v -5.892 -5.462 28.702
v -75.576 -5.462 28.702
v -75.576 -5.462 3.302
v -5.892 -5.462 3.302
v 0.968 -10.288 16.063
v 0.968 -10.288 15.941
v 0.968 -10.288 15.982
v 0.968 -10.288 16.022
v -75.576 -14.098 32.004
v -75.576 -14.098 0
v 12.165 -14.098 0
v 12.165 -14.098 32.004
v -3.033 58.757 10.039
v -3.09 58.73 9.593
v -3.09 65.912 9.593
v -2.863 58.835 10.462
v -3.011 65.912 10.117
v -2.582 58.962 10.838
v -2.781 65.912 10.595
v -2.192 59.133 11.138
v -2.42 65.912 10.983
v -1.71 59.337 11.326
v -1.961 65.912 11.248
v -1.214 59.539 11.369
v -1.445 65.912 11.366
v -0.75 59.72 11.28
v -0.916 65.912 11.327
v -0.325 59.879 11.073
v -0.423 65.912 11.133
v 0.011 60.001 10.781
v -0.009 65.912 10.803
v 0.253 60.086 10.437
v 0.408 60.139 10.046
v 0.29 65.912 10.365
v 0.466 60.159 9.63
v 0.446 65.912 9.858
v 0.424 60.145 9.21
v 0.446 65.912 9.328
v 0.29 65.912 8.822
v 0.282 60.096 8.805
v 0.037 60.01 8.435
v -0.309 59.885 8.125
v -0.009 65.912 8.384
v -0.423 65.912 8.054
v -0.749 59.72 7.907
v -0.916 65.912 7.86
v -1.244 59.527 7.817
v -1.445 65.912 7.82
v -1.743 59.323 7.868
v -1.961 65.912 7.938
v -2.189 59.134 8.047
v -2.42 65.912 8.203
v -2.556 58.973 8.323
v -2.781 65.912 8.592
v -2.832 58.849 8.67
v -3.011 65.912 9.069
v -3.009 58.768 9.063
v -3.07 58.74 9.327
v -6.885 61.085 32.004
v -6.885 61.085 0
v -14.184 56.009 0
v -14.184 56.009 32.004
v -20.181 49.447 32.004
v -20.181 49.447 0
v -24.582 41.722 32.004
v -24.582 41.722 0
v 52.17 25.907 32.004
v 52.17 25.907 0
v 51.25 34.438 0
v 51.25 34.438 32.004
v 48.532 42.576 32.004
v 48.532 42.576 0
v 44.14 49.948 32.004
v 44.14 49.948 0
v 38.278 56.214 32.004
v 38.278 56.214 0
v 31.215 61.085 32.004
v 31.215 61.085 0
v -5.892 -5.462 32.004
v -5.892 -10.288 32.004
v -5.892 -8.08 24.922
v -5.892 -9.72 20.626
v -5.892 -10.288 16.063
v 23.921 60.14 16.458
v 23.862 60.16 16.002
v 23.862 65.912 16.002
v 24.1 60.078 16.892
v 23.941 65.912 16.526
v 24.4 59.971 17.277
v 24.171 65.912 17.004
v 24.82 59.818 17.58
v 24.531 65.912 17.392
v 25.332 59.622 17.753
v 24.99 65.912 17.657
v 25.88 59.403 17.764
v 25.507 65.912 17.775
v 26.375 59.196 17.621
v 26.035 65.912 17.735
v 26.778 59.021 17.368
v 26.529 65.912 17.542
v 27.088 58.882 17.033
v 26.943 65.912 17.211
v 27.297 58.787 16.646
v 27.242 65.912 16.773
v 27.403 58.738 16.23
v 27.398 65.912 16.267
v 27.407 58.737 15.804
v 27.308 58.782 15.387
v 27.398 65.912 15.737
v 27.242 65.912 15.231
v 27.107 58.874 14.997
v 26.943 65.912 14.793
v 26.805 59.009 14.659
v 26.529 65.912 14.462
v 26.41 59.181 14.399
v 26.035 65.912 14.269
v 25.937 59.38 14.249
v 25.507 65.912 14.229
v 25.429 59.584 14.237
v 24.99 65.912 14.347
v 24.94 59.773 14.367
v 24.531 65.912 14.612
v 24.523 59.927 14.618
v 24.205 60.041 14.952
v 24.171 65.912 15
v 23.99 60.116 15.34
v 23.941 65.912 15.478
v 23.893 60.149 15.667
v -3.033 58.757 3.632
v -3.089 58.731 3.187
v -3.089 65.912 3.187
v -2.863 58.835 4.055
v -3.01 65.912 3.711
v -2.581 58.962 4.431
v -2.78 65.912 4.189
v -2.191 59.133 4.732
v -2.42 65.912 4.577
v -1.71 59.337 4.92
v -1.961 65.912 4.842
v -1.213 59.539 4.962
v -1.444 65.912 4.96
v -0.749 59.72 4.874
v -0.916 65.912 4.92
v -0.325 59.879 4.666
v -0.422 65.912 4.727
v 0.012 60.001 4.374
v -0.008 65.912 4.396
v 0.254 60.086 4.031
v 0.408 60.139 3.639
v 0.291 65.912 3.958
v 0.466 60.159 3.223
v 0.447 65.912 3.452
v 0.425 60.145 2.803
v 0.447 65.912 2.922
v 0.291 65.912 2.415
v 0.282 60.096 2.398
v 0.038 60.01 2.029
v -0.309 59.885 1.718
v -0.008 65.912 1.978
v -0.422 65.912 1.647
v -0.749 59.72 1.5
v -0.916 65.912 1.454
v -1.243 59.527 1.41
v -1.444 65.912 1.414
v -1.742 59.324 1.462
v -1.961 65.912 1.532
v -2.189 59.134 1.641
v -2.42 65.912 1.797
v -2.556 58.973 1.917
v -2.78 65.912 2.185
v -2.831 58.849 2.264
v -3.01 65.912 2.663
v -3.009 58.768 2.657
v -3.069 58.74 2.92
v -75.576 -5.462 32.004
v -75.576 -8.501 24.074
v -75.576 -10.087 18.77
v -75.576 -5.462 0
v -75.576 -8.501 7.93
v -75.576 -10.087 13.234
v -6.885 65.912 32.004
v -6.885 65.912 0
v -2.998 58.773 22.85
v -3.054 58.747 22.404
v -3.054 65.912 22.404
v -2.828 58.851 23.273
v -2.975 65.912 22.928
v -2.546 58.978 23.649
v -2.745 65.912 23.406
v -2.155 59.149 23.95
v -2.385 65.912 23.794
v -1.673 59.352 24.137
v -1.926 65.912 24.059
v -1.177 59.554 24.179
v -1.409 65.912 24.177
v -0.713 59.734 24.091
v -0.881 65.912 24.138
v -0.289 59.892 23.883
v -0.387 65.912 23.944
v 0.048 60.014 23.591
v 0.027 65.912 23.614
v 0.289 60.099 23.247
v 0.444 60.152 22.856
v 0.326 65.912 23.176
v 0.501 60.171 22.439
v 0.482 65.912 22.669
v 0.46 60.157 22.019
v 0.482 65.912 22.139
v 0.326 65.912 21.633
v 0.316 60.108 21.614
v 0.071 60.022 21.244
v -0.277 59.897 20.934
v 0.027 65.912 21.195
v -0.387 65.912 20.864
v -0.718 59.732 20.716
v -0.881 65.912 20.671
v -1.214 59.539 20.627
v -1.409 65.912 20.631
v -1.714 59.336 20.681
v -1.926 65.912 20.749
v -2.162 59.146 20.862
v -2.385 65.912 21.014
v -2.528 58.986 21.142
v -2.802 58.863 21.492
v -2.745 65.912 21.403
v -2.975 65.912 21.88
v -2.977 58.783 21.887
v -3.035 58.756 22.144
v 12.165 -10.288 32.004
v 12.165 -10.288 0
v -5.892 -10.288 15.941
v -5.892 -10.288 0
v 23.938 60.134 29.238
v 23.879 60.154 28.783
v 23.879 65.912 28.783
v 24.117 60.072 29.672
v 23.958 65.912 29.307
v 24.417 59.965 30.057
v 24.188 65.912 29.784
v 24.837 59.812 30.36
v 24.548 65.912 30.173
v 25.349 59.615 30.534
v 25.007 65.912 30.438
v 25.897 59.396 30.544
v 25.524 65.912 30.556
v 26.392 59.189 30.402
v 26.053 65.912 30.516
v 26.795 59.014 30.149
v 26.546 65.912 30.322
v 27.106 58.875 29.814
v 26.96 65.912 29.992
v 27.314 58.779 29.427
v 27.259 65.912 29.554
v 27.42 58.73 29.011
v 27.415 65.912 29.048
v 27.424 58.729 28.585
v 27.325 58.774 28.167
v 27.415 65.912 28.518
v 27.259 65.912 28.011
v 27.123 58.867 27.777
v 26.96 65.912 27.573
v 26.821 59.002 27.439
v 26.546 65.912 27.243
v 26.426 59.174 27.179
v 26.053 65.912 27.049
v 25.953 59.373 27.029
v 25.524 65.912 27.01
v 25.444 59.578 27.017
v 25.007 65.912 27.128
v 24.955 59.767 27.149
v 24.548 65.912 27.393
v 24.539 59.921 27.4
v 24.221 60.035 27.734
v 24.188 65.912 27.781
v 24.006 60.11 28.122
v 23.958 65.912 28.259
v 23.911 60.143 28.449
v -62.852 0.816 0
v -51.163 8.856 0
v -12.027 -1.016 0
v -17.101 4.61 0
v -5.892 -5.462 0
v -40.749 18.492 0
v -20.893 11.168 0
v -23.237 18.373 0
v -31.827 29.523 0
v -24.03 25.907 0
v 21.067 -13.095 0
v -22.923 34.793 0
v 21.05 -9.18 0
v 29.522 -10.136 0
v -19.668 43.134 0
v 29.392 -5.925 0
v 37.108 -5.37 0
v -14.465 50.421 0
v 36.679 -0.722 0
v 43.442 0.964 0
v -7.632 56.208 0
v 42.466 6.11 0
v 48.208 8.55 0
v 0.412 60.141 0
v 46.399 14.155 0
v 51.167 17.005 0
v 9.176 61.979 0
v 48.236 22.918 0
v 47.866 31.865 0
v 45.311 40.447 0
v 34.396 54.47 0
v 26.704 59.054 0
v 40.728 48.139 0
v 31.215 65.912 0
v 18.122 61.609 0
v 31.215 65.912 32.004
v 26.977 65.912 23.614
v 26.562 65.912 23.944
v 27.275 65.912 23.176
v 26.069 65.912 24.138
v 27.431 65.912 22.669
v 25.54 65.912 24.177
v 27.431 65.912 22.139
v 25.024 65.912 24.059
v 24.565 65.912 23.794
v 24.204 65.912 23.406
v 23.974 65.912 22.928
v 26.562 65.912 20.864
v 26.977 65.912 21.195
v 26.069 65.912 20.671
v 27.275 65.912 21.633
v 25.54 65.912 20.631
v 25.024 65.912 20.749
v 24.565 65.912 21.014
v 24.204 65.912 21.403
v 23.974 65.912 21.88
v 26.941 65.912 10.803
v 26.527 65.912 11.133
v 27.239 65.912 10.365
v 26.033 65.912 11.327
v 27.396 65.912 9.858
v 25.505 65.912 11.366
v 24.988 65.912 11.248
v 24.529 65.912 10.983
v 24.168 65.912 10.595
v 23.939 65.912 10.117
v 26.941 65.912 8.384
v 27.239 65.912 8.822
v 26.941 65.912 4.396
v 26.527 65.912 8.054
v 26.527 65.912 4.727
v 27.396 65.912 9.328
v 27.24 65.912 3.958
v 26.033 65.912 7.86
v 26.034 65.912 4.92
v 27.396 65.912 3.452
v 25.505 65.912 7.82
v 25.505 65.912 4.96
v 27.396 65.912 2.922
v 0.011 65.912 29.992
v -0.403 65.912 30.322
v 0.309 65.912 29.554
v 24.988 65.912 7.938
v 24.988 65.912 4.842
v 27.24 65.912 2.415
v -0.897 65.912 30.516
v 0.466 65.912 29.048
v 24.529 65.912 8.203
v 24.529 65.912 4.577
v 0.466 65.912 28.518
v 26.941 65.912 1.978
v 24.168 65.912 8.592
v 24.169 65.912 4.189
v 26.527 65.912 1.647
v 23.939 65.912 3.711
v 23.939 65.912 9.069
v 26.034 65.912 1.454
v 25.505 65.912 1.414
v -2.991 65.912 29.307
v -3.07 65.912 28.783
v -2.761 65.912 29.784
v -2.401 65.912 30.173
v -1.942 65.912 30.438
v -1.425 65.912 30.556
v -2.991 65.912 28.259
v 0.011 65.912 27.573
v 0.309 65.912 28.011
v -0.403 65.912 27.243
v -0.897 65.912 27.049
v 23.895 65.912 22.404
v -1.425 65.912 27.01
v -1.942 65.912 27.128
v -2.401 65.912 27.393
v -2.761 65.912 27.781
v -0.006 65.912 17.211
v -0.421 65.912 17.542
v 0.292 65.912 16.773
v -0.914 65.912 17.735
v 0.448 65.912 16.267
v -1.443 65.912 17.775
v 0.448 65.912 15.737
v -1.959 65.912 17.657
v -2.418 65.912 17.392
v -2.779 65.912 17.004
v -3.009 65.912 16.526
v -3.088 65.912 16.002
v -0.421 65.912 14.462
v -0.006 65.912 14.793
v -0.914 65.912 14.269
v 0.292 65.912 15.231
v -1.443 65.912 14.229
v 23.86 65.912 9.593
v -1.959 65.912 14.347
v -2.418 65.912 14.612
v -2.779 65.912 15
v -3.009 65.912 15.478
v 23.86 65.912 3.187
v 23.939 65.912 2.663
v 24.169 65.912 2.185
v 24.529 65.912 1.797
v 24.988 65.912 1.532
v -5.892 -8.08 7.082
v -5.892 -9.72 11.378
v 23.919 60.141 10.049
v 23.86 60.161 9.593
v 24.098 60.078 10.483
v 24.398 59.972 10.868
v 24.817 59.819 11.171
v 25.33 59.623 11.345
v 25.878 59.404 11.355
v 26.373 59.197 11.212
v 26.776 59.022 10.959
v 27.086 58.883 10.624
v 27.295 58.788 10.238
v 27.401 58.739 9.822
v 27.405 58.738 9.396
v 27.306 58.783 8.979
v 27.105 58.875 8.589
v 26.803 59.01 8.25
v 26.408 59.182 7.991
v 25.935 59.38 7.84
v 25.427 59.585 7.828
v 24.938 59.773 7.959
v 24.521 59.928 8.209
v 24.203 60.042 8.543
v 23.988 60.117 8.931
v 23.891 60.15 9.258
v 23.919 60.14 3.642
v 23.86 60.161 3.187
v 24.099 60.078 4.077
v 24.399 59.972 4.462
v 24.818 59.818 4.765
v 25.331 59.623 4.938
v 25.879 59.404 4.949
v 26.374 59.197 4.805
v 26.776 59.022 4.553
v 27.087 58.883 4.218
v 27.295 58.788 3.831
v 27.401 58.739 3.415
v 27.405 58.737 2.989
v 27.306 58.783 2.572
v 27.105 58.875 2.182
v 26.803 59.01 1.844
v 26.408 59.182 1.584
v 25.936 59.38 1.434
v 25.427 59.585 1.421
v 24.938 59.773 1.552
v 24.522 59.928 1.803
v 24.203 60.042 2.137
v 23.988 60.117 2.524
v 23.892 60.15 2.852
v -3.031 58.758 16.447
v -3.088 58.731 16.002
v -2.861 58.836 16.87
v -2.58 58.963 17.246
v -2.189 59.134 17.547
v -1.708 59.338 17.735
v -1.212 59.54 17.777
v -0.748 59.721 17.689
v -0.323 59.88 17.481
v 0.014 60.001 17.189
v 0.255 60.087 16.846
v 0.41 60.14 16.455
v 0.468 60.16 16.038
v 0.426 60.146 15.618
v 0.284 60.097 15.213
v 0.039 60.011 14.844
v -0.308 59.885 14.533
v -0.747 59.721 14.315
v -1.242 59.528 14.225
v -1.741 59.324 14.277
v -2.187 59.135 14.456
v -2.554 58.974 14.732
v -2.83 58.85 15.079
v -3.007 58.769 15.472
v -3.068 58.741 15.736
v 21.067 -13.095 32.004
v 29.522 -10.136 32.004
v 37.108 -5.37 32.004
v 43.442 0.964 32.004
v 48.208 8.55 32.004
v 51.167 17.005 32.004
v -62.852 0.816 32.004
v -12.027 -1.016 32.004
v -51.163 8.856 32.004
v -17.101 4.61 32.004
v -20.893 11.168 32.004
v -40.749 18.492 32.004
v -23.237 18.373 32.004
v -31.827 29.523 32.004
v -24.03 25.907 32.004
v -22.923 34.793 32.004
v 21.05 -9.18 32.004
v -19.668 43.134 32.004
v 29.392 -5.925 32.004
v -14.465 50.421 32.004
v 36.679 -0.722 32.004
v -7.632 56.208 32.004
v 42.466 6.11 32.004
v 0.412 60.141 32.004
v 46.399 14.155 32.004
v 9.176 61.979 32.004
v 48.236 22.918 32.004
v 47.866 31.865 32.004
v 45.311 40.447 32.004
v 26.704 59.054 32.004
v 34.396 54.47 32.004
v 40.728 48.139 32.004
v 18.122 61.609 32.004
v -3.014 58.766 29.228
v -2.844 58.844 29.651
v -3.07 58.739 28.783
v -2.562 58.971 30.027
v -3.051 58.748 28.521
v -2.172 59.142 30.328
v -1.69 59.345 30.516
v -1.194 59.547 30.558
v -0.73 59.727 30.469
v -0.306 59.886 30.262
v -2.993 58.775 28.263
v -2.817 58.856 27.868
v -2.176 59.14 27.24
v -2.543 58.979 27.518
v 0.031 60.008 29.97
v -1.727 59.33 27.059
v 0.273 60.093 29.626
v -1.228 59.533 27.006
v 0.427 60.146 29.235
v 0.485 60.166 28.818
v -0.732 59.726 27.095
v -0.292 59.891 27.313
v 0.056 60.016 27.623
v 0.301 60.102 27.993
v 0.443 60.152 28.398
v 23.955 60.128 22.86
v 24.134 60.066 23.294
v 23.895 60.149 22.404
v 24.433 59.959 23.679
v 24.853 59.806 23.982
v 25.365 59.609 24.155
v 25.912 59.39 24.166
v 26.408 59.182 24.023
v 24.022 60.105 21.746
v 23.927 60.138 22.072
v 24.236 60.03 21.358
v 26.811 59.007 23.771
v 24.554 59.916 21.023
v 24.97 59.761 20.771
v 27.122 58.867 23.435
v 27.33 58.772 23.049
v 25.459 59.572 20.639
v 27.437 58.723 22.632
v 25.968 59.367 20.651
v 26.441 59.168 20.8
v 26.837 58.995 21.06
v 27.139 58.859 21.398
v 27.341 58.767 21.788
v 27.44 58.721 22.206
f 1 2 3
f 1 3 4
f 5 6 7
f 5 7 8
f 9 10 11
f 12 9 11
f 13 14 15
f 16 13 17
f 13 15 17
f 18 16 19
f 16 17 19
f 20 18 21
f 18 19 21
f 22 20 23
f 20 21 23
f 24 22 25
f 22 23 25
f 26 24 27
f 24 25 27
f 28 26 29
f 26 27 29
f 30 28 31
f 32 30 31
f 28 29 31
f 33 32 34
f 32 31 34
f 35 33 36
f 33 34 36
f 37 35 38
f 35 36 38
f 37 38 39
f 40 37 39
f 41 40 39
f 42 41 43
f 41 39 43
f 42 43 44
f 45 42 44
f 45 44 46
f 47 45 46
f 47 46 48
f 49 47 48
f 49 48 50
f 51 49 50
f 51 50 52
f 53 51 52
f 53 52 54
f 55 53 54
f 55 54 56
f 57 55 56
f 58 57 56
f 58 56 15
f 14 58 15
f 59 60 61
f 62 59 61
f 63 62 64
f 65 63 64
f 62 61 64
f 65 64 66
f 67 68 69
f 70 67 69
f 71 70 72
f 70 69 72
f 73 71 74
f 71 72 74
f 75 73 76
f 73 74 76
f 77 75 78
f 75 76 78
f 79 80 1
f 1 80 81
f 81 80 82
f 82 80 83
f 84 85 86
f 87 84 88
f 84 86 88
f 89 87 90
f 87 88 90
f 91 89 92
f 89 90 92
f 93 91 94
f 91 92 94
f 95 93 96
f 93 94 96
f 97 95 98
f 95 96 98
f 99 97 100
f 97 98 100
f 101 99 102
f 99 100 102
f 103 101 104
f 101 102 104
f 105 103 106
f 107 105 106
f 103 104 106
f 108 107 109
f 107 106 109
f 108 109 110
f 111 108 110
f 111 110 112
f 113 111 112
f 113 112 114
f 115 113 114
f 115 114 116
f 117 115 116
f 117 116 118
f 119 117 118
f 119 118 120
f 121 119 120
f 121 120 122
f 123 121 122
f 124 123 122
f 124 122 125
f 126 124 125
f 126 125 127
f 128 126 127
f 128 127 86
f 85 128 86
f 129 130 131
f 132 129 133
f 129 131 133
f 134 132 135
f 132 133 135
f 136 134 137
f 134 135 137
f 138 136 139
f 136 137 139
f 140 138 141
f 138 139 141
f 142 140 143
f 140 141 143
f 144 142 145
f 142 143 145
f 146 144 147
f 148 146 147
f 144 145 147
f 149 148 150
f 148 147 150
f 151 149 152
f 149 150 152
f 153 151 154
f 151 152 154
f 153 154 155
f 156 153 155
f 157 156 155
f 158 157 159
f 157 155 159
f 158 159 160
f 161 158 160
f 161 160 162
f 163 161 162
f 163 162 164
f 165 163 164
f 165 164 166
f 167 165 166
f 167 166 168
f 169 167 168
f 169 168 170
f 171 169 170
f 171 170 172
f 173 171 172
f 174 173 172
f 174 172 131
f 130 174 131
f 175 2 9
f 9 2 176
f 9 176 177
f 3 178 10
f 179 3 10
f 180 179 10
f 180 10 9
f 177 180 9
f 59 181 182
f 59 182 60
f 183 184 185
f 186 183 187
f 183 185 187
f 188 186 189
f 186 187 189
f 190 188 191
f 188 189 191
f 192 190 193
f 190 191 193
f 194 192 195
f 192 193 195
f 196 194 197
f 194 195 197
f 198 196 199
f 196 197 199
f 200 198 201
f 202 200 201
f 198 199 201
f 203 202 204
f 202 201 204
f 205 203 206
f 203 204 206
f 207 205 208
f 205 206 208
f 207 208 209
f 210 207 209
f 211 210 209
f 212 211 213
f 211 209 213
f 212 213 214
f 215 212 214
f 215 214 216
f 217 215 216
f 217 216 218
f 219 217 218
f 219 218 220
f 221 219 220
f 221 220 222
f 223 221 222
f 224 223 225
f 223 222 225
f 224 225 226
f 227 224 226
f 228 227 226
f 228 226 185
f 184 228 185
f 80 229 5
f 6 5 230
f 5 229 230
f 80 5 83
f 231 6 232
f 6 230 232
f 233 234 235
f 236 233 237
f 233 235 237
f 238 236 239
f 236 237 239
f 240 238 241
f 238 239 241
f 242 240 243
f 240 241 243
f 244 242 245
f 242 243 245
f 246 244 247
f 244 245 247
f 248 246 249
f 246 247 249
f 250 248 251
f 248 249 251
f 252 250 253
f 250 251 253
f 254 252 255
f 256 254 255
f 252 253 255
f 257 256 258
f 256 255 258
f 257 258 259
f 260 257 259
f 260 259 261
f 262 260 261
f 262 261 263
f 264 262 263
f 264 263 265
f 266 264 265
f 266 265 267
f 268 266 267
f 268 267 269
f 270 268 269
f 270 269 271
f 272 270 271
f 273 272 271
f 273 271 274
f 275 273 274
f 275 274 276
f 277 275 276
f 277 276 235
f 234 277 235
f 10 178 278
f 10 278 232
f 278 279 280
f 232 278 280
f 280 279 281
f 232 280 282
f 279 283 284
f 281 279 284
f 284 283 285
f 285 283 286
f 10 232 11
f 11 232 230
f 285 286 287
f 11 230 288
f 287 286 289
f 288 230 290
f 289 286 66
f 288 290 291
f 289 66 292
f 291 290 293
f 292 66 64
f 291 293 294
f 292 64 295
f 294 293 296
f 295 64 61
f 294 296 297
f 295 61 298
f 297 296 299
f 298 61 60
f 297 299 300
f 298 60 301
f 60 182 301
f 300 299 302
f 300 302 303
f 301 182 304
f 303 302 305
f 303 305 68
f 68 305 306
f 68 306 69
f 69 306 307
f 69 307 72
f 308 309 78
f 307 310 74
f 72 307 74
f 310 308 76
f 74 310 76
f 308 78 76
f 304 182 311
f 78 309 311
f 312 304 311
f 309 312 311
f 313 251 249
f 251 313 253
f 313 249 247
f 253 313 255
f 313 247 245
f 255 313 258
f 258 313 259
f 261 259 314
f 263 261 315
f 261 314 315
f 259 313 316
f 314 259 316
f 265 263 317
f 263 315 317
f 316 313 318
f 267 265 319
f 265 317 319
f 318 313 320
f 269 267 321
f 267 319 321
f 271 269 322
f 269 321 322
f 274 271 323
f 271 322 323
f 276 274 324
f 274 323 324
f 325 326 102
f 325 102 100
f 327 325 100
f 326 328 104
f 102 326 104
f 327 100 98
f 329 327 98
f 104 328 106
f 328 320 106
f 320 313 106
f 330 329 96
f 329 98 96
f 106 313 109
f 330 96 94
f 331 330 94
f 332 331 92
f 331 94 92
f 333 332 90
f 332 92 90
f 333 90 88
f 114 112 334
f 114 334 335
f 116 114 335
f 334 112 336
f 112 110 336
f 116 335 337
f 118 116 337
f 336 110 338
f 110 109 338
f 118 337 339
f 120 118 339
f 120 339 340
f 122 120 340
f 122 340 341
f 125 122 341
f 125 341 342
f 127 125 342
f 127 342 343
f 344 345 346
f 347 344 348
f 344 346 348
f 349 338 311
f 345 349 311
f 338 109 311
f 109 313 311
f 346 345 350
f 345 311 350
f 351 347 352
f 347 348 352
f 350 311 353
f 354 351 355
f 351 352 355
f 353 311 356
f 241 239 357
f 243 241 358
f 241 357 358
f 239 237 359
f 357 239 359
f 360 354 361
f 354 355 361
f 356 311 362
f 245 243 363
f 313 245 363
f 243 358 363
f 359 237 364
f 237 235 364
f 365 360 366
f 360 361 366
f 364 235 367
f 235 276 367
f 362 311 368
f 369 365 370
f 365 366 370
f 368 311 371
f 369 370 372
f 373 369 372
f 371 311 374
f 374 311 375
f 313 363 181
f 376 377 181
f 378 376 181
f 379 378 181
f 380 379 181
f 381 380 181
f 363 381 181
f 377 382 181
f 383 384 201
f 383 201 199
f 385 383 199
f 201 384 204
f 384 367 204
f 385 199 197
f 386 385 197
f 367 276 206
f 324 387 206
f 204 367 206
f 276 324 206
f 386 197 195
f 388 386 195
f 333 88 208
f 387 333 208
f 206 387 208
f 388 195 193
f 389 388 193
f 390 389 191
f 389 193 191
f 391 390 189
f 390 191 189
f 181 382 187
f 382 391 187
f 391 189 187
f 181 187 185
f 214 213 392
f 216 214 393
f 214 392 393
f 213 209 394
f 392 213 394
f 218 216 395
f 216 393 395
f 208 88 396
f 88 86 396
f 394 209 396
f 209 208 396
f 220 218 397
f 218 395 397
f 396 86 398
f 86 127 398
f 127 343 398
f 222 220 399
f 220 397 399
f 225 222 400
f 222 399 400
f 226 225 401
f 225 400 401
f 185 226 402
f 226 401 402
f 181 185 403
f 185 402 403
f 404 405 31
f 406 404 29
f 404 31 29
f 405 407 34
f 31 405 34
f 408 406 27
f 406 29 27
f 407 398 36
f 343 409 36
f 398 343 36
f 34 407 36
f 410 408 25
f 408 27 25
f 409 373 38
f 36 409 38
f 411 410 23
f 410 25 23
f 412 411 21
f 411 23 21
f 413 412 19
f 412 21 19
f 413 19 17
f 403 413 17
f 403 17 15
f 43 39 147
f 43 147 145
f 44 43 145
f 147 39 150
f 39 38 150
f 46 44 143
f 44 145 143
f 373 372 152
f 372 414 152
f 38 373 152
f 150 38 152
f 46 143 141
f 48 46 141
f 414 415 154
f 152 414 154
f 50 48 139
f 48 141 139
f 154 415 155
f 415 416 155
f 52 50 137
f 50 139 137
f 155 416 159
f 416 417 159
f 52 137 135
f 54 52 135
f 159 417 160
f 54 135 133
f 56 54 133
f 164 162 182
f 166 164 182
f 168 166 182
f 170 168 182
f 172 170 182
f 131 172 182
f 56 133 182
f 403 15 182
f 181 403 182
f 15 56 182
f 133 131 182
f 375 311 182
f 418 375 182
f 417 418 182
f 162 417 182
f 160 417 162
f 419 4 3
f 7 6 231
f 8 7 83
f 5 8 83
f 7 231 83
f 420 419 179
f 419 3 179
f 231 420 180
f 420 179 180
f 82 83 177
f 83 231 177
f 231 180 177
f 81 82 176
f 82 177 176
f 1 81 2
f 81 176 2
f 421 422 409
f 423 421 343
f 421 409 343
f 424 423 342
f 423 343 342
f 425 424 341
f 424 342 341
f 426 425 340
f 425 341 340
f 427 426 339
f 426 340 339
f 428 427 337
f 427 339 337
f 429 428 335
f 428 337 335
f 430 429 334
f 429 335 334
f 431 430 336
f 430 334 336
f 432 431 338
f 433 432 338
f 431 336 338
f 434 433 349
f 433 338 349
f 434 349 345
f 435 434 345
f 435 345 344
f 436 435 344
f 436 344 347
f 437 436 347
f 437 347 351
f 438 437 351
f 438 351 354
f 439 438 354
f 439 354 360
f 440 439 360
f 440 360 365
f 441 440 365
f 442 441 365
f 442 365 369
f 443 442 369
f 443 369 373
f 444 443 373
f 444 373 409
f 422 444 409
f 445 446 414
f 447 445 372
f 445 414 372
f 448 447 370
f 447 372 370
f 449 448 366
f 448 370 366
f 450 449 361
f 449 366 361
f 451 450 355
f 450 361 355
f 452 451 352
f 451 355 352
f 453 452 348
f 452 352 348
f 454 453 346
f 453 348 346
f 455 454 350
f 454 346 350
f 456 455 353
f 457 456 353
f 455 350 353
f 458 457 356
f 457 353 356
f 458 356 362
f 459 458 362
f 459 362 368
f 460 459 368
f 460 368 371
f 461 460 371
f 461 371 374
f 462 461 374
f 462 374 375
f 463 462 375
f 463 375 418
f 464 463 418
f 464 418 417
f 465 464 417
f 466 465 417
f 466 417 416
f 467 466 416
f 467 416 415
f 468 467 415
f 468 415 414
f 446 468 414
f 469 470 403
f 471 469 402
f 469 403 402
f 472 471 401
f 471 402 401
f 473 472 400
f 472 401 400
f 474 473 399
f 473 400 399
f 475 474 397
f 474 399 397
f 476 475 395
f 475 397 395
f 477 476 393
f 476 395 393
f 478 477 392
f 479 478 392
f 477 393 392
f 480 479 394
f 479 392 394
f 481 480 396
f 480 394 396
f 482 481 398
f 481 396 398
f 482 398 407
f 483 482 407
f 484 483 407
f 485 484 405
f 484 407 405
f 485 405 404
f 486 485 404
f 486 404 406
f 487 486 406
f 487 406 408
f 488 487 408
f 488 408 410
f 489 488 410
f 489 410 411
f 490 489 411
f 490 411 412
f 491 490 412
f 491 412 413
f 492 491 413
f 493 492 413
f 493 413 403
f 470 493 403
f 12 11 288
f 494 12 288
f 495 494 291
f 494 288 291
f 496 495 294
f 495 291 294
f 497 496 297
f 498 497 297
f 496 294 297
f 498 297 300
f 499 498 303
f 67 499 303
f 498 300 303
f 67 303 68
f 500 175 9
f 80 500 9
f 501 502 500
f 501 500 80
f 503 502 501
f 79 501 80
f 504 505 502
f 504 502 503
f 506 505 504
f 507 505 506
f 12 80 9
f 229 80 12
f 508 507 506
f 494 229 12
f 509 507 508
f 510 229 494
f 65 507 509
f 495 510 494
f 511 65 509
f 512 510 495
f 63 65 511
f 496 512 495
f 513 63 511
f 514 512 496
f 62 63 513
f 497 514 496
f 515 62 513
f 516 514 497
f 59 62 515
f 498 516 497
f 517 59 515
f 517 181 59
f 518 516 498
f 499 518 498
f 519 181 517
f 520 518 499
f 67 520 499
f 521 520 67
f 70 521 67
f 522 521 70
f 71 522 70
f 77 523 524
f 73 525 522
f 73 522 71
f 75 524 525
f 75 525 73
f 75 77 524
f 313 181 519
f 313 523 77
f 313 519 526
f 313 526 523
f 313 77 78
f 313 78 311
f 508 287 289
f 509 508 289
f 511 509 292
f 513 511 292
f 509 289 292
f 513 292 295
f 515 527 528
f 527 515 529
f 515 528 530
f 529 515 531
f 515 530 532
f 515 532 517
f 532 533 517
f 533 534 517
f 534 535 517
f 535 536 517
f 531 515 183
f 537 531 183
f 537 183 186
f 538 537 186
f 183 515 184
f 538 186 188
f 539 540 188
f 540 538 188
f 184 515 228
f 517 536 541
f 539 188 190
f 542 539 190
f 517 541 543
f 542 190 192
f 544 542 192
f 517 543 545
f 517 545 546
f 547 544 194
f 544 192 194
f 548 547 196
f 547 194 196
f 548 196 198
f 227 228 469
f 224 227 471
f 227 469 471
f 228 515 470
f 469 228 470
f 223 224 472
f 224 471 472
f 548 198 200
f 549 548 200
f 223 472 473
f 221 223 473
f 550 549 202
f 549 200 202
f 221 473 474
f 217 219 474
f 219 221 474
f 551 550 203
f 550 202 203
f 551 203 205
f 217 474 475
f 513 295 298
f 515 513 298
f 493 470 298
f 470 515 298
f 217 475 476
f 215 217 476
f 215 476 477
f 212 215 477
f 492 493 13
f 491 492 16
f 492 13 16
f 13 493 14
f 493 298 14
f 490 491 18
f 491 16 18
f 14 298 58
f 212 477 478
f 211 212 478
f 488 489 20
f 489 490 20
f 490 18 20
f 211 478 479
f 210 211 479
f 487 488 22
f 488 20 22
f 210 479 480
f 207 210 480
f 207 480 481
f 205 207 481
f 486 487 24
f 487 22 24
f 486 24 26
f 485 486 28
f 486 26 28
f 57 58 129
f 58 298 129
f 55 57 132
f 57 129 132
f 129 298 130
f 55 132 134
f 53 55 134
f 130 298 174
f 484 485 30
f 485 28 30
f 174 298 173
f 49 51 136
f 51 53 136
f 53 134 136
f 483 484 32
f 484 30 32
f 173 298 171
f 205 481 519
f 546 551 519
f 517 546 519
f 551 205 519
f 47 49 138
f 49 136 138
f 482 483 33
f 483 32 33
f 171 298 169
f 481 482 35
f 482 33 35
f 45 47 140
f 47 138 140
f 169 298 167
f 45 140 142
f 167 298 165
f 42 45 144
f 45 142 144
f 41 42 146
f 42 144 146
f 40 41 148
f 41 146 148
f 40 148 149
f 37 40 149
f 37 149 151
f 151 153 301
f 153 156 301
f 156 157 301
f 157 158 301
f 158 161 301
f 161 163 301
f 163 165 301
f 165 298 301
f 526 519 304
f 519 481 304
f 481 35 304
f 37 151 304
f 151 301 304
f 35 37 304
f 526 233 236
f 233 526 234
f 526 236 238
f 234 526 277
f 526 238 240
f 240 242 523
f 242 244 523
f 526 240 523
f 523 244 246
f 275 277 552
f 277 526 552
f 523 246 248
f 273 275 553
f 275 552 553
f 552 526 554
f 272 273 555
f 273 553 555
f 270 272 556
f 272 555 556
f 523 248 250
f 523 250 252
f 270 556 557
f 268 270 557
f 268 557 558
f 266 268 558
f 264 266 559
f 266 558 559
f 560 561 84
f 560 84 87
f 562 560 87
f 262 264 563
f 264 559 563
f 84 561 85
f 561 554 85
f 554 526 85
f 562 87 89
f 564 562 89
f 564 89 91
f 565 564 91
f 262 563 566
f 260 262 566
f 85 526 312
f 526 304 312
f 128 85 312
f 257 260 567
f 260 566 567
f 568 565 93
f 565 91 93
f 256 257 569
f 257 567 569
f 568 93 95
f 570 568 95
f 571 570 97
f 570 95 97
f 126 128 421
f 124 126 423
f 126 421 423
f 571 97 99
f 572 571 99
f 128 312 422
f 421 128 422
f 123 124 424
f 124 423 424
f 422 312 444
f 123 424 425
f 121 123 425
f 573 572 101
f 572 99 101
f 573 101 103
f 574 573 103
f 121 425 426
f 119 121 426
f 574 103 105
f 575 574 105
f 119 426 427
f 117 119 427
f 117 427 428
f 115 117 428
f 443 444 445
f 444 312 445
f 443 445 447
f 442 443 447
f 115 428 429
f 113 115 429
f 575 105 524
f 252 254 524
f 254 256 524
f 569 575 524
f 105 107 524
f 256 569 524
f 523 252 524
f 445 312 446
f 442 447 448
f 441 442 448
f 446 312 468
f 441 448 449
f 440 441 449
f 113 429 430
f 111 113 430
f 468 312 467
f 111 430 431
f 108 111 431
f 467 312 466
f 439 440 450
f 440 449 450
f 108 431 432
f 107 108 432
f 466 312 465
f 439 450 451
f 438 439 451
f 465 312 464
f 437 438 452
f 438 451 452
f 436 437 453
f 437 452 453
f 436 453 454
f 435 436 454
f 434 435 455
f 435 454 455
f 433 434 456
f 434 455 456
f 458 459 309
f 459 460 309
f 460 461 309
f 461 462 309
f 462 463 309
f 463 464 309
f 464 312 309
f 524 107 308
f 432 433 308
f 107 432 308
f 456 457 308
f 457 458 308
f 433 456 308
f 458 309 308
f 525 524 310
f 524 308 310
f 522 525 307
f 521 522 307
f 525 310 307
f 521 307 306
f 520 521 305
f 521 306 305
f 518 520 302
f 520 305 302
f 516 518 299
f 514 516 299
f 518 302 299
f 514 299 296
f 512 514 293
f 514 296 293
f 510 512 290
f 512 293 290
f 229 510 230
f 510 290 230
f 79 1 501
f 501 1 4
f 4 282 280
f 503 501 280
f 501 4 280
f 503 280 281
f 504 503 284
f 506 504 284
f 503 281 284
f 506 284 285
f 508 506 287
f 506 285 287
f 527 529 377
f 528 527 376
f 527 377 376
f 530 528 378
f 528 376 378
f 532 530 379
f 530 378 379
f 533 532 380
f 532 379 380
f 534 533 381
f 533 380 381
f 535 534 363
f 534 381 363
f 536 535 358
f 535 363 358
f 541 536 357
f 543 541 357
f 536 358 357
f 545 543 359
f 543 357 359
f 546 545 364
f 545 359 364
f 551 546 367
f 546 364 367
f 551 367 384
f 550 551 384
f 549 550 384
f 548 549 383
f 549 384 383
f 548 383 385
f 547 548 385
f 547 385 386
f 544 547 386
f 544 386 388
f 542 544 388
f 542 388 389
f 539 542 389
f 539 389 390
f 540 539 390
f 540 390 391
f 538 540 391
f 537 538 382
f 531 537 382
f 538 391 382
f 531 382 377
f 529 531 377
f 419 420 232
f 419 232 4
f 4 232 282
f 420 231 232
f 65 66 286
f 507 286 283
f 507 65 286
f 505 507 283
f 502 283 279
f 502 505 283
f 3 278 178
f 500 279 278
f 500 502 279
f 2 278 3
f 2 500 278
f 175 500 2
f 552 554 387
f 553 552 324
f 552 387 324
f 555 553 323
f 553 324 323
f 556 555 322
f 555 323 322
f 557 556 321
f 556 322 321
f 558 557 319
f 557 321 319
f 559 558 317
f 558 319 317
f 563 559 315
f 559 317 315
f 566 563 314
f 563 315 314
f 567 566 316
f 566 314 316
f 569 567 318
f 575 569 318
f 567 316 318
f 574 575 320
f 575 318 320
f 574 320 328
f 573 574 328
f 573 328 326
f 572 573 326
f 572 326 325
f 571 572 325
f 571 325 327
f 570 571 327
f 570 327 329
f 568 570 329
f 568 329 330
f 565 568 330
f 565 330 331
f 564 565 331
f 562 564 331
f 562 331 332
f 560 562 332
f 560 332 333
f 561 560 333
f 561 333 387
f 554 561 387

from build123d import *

# Parameters (mm, degrees)
F1_DEPTH = 32.004
F3_DEPTH = 76.54355
F4_R     = 1.778
F5_DEPTH = 44.60469
F7_DEPTH = 32.004


# Not quite as in the source:
# - ends of sketch curves that miss each other by under 0.0002 mm in the source are joined


with BuildPart() as f1:
    # F0 (on Top) → F1 (new body)
    with BuildSketch(Plane.XY):
        with BuildLine():
            Line((-6.8850605494, 65.9121533447), (-6.8850605494, 61.0852363653))
            ThreePointArc((-6.8850605494, 61.0852363653), (-22.2043438922, 46.3803648051), (-27.8400605494, 25.9071533447))
            ThreePointArc((-27.8400605494, 25.9071533447), (-23.8462320221, 8.4831597105), (-12.6621800762, -5.4618466553))
            Line((-12.6621800762, -5.4618466553), (-75.5756720901, -5.4618466553))
            Line((-75.5756720901, -5.4618466553), (-75.5756720901, -14.0978466553))
            Line((-75.5756720901, -14.0978466553), (12.1649394506, -14.0978466553))
            ThreePointArc((12.1649394506, -14.0978466553), (40.452746232, -2.3806534366), (52.1699394506, 25.9071533447))
            ThreePointArc((52.1699394506, 25.9071533447), (46.5342227935, 46.3803648051), (31.2149394506, 61.0852363653))
            Line((31.2149394506, 61.0852363653), (31.2149394506, 65.9121533447))
            Line((31.2149394506, 65.9121533447), (12.1649394506, 65.9121533447))
            Line((12.1649394506, 65.9121533447), (-6.8850605494, 65.9121533447))
        make_face()
        with BuildLine():
            Line((-5.8923298493, -10.2878466553), (-5.8923298493, -5.4618466553))
            ThreePointArc((-5.8923298493, -5.4618466553), (-19.1692254039, 7.7895338028), (-24.0300605494, 25.9071533447))
            ThreePointArc((-24.0300605494, 25.9071533447), (12.1649394506, 62.1021533447), (48.3599394506, 25.9071533447))
            ThreePointArc((48.3599394506, 25.9071533447), (37.7586693957, 0.3134233997), (12.1649394506, -10.2878466553))
            Line((12.1649394506, -10.2878466553), (-5.8923298493, -10.2878466553))
        make_face(mode=Mode.SUBTRACT)
    extrude(amount=F1_DEPTH)

    # F2 (on face) → F3 (cut)
    with BuildSketch(Plane(origin=(-75.5756720901, 0, 0), x_dir=(0, -1, 0), z_dir=(-1, 0, 0))):
        with BuildLine():
            Line((5.4618466553, 28.702), (5.4618466553, 3.302))
            ThreePointArc((5.4618466553, 3.302), (10.2879432961, 16.002), (5.4618466553, 28.702))
        make_face()
    extrude(amount=-F3_DEPTH, mode=Mode.SUBTRACT)

    # F4 (on face) → F5 (cut)
    with BuildSketch(Plane(origin=(0, 65.9121533447, 0), x_dir=(-1, 0, 0), z_dir=(0, 1, 0))):
        with Locations((-25.6732087171, 22.4042255431)):
            Circle(F4_R)
        with Locations((-25.6569720394, 28.7826433778)):
            Circle(F4_R)
        with Locations((-25.6396394506, 16.002)):
            Circle(F4_R)
        with Locations((-25.6375241614, 9.5933126286)):
            Circle(F4_R)
        with Locations((-25.6380084491, 3.1869229861)):
            Circle(F4_R)
        with Locations((1.3113915509, 3.1869229861)):
            Circle(F4_R)
        with Locations((1.3118758386, 9.5933126286)):
            Circle(F4_R)
        with Locations((1.3097605494, 16.002)):
            Circle(F4_R)
        with Locations((1.2761912829, 22.4042255431)):
            Circle(F4_R)
        with Locations((1.2924279606, 28.7826433778)):
            Circle(F4_R)
    extrude(amount=-F5_DEPTH, mode=Mode.SUBTRACT)

    # F6 (on face) → F7 (join)
    with BuildSketch(Plane.XY.offset(32.004)):
        with BuildLine():
            ThreePointArc((-24.5815716288, 41.7215122786), (-45.7821906846, 13.486402418), (-75.5756720901, -5.4618466553))
            Line((-75.5756720901, -5.4618466553), (-12.6621800762, -5.4618466553))
            ThreePointArc((-12.6621800762, -5.4618466553), (-23.9121515851, 16.7934110455), (-24.5815716288, 41.7215122786))
        make_face()
    extrude(amount=-F7_DEPTH)


solid = f1.part
